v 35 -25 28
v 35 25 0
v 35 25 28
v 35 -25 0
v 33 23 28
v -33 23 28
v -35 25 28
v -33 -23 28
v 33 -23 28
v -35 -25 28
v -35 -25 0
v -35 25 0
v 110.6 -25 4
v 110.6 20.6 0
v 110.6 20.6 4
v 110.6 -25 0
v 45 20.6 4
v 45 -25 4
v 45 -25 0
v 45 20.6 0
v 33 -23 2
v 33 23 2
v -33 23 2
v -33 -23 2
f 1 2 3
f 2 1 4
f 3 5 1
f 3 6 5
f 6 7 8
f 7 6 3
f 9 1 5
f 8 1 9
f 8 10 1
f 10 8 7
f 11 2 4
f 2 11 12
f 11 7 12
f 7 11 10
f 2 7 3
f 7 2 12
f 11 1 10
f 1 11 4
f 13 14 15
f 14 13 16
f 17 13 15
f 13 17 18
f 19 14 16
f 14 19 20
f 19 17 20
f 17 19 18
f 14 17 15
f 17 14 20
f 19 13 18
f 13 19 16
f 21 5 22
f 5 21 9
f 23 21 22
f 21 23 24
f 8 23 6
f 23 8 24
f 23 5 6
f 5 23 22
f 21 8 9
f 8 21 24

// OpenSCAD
// Two-part enclosure for small electronics board
// Print orientation: both parts flat on bed, lid on +X side of box

// ---- Box ----
box_x = 70;      // outer length (X)
box_y = 50;      // outer width (Y)
box_z = 30;      // outer height (Z)
wall = 2;        // side wall thickness
floor = 2;       // floor thickness

// ---- Lid ----
lip_w = 65.6;    // lip outer length (X)
lip_d = 45.6;    // lip outer width (Y)
lip_h = 4;       // lip height (wall thickness)
eps = 0.2;       // clearance between lip and box opening

// ---- Misc ----
gap = 10;        // gap between parts on bed
overlap = 0.01;  // small overlap so lid sits in box in union

$fn = 64;

difference() {
    union() {
        // Box (open top)
        translate([-box_x/2, -box_y/2, 0])
            cube([box_x, box_y, box_z - wall]);
        // Lid (printed upside down, resting on bed)
        translate([box_x/2 + gap, -box_y/2, 0])
            cube([lip_w, lip_d, lip_h]);
    }
    // Cut the open-top cavity
    translate([-box_x/2 + wall, -box_y/2 + wall, floor])
        cube([box_x - 2*wall, box_y - 2*wall, box_z - wall + overlap]);
}
